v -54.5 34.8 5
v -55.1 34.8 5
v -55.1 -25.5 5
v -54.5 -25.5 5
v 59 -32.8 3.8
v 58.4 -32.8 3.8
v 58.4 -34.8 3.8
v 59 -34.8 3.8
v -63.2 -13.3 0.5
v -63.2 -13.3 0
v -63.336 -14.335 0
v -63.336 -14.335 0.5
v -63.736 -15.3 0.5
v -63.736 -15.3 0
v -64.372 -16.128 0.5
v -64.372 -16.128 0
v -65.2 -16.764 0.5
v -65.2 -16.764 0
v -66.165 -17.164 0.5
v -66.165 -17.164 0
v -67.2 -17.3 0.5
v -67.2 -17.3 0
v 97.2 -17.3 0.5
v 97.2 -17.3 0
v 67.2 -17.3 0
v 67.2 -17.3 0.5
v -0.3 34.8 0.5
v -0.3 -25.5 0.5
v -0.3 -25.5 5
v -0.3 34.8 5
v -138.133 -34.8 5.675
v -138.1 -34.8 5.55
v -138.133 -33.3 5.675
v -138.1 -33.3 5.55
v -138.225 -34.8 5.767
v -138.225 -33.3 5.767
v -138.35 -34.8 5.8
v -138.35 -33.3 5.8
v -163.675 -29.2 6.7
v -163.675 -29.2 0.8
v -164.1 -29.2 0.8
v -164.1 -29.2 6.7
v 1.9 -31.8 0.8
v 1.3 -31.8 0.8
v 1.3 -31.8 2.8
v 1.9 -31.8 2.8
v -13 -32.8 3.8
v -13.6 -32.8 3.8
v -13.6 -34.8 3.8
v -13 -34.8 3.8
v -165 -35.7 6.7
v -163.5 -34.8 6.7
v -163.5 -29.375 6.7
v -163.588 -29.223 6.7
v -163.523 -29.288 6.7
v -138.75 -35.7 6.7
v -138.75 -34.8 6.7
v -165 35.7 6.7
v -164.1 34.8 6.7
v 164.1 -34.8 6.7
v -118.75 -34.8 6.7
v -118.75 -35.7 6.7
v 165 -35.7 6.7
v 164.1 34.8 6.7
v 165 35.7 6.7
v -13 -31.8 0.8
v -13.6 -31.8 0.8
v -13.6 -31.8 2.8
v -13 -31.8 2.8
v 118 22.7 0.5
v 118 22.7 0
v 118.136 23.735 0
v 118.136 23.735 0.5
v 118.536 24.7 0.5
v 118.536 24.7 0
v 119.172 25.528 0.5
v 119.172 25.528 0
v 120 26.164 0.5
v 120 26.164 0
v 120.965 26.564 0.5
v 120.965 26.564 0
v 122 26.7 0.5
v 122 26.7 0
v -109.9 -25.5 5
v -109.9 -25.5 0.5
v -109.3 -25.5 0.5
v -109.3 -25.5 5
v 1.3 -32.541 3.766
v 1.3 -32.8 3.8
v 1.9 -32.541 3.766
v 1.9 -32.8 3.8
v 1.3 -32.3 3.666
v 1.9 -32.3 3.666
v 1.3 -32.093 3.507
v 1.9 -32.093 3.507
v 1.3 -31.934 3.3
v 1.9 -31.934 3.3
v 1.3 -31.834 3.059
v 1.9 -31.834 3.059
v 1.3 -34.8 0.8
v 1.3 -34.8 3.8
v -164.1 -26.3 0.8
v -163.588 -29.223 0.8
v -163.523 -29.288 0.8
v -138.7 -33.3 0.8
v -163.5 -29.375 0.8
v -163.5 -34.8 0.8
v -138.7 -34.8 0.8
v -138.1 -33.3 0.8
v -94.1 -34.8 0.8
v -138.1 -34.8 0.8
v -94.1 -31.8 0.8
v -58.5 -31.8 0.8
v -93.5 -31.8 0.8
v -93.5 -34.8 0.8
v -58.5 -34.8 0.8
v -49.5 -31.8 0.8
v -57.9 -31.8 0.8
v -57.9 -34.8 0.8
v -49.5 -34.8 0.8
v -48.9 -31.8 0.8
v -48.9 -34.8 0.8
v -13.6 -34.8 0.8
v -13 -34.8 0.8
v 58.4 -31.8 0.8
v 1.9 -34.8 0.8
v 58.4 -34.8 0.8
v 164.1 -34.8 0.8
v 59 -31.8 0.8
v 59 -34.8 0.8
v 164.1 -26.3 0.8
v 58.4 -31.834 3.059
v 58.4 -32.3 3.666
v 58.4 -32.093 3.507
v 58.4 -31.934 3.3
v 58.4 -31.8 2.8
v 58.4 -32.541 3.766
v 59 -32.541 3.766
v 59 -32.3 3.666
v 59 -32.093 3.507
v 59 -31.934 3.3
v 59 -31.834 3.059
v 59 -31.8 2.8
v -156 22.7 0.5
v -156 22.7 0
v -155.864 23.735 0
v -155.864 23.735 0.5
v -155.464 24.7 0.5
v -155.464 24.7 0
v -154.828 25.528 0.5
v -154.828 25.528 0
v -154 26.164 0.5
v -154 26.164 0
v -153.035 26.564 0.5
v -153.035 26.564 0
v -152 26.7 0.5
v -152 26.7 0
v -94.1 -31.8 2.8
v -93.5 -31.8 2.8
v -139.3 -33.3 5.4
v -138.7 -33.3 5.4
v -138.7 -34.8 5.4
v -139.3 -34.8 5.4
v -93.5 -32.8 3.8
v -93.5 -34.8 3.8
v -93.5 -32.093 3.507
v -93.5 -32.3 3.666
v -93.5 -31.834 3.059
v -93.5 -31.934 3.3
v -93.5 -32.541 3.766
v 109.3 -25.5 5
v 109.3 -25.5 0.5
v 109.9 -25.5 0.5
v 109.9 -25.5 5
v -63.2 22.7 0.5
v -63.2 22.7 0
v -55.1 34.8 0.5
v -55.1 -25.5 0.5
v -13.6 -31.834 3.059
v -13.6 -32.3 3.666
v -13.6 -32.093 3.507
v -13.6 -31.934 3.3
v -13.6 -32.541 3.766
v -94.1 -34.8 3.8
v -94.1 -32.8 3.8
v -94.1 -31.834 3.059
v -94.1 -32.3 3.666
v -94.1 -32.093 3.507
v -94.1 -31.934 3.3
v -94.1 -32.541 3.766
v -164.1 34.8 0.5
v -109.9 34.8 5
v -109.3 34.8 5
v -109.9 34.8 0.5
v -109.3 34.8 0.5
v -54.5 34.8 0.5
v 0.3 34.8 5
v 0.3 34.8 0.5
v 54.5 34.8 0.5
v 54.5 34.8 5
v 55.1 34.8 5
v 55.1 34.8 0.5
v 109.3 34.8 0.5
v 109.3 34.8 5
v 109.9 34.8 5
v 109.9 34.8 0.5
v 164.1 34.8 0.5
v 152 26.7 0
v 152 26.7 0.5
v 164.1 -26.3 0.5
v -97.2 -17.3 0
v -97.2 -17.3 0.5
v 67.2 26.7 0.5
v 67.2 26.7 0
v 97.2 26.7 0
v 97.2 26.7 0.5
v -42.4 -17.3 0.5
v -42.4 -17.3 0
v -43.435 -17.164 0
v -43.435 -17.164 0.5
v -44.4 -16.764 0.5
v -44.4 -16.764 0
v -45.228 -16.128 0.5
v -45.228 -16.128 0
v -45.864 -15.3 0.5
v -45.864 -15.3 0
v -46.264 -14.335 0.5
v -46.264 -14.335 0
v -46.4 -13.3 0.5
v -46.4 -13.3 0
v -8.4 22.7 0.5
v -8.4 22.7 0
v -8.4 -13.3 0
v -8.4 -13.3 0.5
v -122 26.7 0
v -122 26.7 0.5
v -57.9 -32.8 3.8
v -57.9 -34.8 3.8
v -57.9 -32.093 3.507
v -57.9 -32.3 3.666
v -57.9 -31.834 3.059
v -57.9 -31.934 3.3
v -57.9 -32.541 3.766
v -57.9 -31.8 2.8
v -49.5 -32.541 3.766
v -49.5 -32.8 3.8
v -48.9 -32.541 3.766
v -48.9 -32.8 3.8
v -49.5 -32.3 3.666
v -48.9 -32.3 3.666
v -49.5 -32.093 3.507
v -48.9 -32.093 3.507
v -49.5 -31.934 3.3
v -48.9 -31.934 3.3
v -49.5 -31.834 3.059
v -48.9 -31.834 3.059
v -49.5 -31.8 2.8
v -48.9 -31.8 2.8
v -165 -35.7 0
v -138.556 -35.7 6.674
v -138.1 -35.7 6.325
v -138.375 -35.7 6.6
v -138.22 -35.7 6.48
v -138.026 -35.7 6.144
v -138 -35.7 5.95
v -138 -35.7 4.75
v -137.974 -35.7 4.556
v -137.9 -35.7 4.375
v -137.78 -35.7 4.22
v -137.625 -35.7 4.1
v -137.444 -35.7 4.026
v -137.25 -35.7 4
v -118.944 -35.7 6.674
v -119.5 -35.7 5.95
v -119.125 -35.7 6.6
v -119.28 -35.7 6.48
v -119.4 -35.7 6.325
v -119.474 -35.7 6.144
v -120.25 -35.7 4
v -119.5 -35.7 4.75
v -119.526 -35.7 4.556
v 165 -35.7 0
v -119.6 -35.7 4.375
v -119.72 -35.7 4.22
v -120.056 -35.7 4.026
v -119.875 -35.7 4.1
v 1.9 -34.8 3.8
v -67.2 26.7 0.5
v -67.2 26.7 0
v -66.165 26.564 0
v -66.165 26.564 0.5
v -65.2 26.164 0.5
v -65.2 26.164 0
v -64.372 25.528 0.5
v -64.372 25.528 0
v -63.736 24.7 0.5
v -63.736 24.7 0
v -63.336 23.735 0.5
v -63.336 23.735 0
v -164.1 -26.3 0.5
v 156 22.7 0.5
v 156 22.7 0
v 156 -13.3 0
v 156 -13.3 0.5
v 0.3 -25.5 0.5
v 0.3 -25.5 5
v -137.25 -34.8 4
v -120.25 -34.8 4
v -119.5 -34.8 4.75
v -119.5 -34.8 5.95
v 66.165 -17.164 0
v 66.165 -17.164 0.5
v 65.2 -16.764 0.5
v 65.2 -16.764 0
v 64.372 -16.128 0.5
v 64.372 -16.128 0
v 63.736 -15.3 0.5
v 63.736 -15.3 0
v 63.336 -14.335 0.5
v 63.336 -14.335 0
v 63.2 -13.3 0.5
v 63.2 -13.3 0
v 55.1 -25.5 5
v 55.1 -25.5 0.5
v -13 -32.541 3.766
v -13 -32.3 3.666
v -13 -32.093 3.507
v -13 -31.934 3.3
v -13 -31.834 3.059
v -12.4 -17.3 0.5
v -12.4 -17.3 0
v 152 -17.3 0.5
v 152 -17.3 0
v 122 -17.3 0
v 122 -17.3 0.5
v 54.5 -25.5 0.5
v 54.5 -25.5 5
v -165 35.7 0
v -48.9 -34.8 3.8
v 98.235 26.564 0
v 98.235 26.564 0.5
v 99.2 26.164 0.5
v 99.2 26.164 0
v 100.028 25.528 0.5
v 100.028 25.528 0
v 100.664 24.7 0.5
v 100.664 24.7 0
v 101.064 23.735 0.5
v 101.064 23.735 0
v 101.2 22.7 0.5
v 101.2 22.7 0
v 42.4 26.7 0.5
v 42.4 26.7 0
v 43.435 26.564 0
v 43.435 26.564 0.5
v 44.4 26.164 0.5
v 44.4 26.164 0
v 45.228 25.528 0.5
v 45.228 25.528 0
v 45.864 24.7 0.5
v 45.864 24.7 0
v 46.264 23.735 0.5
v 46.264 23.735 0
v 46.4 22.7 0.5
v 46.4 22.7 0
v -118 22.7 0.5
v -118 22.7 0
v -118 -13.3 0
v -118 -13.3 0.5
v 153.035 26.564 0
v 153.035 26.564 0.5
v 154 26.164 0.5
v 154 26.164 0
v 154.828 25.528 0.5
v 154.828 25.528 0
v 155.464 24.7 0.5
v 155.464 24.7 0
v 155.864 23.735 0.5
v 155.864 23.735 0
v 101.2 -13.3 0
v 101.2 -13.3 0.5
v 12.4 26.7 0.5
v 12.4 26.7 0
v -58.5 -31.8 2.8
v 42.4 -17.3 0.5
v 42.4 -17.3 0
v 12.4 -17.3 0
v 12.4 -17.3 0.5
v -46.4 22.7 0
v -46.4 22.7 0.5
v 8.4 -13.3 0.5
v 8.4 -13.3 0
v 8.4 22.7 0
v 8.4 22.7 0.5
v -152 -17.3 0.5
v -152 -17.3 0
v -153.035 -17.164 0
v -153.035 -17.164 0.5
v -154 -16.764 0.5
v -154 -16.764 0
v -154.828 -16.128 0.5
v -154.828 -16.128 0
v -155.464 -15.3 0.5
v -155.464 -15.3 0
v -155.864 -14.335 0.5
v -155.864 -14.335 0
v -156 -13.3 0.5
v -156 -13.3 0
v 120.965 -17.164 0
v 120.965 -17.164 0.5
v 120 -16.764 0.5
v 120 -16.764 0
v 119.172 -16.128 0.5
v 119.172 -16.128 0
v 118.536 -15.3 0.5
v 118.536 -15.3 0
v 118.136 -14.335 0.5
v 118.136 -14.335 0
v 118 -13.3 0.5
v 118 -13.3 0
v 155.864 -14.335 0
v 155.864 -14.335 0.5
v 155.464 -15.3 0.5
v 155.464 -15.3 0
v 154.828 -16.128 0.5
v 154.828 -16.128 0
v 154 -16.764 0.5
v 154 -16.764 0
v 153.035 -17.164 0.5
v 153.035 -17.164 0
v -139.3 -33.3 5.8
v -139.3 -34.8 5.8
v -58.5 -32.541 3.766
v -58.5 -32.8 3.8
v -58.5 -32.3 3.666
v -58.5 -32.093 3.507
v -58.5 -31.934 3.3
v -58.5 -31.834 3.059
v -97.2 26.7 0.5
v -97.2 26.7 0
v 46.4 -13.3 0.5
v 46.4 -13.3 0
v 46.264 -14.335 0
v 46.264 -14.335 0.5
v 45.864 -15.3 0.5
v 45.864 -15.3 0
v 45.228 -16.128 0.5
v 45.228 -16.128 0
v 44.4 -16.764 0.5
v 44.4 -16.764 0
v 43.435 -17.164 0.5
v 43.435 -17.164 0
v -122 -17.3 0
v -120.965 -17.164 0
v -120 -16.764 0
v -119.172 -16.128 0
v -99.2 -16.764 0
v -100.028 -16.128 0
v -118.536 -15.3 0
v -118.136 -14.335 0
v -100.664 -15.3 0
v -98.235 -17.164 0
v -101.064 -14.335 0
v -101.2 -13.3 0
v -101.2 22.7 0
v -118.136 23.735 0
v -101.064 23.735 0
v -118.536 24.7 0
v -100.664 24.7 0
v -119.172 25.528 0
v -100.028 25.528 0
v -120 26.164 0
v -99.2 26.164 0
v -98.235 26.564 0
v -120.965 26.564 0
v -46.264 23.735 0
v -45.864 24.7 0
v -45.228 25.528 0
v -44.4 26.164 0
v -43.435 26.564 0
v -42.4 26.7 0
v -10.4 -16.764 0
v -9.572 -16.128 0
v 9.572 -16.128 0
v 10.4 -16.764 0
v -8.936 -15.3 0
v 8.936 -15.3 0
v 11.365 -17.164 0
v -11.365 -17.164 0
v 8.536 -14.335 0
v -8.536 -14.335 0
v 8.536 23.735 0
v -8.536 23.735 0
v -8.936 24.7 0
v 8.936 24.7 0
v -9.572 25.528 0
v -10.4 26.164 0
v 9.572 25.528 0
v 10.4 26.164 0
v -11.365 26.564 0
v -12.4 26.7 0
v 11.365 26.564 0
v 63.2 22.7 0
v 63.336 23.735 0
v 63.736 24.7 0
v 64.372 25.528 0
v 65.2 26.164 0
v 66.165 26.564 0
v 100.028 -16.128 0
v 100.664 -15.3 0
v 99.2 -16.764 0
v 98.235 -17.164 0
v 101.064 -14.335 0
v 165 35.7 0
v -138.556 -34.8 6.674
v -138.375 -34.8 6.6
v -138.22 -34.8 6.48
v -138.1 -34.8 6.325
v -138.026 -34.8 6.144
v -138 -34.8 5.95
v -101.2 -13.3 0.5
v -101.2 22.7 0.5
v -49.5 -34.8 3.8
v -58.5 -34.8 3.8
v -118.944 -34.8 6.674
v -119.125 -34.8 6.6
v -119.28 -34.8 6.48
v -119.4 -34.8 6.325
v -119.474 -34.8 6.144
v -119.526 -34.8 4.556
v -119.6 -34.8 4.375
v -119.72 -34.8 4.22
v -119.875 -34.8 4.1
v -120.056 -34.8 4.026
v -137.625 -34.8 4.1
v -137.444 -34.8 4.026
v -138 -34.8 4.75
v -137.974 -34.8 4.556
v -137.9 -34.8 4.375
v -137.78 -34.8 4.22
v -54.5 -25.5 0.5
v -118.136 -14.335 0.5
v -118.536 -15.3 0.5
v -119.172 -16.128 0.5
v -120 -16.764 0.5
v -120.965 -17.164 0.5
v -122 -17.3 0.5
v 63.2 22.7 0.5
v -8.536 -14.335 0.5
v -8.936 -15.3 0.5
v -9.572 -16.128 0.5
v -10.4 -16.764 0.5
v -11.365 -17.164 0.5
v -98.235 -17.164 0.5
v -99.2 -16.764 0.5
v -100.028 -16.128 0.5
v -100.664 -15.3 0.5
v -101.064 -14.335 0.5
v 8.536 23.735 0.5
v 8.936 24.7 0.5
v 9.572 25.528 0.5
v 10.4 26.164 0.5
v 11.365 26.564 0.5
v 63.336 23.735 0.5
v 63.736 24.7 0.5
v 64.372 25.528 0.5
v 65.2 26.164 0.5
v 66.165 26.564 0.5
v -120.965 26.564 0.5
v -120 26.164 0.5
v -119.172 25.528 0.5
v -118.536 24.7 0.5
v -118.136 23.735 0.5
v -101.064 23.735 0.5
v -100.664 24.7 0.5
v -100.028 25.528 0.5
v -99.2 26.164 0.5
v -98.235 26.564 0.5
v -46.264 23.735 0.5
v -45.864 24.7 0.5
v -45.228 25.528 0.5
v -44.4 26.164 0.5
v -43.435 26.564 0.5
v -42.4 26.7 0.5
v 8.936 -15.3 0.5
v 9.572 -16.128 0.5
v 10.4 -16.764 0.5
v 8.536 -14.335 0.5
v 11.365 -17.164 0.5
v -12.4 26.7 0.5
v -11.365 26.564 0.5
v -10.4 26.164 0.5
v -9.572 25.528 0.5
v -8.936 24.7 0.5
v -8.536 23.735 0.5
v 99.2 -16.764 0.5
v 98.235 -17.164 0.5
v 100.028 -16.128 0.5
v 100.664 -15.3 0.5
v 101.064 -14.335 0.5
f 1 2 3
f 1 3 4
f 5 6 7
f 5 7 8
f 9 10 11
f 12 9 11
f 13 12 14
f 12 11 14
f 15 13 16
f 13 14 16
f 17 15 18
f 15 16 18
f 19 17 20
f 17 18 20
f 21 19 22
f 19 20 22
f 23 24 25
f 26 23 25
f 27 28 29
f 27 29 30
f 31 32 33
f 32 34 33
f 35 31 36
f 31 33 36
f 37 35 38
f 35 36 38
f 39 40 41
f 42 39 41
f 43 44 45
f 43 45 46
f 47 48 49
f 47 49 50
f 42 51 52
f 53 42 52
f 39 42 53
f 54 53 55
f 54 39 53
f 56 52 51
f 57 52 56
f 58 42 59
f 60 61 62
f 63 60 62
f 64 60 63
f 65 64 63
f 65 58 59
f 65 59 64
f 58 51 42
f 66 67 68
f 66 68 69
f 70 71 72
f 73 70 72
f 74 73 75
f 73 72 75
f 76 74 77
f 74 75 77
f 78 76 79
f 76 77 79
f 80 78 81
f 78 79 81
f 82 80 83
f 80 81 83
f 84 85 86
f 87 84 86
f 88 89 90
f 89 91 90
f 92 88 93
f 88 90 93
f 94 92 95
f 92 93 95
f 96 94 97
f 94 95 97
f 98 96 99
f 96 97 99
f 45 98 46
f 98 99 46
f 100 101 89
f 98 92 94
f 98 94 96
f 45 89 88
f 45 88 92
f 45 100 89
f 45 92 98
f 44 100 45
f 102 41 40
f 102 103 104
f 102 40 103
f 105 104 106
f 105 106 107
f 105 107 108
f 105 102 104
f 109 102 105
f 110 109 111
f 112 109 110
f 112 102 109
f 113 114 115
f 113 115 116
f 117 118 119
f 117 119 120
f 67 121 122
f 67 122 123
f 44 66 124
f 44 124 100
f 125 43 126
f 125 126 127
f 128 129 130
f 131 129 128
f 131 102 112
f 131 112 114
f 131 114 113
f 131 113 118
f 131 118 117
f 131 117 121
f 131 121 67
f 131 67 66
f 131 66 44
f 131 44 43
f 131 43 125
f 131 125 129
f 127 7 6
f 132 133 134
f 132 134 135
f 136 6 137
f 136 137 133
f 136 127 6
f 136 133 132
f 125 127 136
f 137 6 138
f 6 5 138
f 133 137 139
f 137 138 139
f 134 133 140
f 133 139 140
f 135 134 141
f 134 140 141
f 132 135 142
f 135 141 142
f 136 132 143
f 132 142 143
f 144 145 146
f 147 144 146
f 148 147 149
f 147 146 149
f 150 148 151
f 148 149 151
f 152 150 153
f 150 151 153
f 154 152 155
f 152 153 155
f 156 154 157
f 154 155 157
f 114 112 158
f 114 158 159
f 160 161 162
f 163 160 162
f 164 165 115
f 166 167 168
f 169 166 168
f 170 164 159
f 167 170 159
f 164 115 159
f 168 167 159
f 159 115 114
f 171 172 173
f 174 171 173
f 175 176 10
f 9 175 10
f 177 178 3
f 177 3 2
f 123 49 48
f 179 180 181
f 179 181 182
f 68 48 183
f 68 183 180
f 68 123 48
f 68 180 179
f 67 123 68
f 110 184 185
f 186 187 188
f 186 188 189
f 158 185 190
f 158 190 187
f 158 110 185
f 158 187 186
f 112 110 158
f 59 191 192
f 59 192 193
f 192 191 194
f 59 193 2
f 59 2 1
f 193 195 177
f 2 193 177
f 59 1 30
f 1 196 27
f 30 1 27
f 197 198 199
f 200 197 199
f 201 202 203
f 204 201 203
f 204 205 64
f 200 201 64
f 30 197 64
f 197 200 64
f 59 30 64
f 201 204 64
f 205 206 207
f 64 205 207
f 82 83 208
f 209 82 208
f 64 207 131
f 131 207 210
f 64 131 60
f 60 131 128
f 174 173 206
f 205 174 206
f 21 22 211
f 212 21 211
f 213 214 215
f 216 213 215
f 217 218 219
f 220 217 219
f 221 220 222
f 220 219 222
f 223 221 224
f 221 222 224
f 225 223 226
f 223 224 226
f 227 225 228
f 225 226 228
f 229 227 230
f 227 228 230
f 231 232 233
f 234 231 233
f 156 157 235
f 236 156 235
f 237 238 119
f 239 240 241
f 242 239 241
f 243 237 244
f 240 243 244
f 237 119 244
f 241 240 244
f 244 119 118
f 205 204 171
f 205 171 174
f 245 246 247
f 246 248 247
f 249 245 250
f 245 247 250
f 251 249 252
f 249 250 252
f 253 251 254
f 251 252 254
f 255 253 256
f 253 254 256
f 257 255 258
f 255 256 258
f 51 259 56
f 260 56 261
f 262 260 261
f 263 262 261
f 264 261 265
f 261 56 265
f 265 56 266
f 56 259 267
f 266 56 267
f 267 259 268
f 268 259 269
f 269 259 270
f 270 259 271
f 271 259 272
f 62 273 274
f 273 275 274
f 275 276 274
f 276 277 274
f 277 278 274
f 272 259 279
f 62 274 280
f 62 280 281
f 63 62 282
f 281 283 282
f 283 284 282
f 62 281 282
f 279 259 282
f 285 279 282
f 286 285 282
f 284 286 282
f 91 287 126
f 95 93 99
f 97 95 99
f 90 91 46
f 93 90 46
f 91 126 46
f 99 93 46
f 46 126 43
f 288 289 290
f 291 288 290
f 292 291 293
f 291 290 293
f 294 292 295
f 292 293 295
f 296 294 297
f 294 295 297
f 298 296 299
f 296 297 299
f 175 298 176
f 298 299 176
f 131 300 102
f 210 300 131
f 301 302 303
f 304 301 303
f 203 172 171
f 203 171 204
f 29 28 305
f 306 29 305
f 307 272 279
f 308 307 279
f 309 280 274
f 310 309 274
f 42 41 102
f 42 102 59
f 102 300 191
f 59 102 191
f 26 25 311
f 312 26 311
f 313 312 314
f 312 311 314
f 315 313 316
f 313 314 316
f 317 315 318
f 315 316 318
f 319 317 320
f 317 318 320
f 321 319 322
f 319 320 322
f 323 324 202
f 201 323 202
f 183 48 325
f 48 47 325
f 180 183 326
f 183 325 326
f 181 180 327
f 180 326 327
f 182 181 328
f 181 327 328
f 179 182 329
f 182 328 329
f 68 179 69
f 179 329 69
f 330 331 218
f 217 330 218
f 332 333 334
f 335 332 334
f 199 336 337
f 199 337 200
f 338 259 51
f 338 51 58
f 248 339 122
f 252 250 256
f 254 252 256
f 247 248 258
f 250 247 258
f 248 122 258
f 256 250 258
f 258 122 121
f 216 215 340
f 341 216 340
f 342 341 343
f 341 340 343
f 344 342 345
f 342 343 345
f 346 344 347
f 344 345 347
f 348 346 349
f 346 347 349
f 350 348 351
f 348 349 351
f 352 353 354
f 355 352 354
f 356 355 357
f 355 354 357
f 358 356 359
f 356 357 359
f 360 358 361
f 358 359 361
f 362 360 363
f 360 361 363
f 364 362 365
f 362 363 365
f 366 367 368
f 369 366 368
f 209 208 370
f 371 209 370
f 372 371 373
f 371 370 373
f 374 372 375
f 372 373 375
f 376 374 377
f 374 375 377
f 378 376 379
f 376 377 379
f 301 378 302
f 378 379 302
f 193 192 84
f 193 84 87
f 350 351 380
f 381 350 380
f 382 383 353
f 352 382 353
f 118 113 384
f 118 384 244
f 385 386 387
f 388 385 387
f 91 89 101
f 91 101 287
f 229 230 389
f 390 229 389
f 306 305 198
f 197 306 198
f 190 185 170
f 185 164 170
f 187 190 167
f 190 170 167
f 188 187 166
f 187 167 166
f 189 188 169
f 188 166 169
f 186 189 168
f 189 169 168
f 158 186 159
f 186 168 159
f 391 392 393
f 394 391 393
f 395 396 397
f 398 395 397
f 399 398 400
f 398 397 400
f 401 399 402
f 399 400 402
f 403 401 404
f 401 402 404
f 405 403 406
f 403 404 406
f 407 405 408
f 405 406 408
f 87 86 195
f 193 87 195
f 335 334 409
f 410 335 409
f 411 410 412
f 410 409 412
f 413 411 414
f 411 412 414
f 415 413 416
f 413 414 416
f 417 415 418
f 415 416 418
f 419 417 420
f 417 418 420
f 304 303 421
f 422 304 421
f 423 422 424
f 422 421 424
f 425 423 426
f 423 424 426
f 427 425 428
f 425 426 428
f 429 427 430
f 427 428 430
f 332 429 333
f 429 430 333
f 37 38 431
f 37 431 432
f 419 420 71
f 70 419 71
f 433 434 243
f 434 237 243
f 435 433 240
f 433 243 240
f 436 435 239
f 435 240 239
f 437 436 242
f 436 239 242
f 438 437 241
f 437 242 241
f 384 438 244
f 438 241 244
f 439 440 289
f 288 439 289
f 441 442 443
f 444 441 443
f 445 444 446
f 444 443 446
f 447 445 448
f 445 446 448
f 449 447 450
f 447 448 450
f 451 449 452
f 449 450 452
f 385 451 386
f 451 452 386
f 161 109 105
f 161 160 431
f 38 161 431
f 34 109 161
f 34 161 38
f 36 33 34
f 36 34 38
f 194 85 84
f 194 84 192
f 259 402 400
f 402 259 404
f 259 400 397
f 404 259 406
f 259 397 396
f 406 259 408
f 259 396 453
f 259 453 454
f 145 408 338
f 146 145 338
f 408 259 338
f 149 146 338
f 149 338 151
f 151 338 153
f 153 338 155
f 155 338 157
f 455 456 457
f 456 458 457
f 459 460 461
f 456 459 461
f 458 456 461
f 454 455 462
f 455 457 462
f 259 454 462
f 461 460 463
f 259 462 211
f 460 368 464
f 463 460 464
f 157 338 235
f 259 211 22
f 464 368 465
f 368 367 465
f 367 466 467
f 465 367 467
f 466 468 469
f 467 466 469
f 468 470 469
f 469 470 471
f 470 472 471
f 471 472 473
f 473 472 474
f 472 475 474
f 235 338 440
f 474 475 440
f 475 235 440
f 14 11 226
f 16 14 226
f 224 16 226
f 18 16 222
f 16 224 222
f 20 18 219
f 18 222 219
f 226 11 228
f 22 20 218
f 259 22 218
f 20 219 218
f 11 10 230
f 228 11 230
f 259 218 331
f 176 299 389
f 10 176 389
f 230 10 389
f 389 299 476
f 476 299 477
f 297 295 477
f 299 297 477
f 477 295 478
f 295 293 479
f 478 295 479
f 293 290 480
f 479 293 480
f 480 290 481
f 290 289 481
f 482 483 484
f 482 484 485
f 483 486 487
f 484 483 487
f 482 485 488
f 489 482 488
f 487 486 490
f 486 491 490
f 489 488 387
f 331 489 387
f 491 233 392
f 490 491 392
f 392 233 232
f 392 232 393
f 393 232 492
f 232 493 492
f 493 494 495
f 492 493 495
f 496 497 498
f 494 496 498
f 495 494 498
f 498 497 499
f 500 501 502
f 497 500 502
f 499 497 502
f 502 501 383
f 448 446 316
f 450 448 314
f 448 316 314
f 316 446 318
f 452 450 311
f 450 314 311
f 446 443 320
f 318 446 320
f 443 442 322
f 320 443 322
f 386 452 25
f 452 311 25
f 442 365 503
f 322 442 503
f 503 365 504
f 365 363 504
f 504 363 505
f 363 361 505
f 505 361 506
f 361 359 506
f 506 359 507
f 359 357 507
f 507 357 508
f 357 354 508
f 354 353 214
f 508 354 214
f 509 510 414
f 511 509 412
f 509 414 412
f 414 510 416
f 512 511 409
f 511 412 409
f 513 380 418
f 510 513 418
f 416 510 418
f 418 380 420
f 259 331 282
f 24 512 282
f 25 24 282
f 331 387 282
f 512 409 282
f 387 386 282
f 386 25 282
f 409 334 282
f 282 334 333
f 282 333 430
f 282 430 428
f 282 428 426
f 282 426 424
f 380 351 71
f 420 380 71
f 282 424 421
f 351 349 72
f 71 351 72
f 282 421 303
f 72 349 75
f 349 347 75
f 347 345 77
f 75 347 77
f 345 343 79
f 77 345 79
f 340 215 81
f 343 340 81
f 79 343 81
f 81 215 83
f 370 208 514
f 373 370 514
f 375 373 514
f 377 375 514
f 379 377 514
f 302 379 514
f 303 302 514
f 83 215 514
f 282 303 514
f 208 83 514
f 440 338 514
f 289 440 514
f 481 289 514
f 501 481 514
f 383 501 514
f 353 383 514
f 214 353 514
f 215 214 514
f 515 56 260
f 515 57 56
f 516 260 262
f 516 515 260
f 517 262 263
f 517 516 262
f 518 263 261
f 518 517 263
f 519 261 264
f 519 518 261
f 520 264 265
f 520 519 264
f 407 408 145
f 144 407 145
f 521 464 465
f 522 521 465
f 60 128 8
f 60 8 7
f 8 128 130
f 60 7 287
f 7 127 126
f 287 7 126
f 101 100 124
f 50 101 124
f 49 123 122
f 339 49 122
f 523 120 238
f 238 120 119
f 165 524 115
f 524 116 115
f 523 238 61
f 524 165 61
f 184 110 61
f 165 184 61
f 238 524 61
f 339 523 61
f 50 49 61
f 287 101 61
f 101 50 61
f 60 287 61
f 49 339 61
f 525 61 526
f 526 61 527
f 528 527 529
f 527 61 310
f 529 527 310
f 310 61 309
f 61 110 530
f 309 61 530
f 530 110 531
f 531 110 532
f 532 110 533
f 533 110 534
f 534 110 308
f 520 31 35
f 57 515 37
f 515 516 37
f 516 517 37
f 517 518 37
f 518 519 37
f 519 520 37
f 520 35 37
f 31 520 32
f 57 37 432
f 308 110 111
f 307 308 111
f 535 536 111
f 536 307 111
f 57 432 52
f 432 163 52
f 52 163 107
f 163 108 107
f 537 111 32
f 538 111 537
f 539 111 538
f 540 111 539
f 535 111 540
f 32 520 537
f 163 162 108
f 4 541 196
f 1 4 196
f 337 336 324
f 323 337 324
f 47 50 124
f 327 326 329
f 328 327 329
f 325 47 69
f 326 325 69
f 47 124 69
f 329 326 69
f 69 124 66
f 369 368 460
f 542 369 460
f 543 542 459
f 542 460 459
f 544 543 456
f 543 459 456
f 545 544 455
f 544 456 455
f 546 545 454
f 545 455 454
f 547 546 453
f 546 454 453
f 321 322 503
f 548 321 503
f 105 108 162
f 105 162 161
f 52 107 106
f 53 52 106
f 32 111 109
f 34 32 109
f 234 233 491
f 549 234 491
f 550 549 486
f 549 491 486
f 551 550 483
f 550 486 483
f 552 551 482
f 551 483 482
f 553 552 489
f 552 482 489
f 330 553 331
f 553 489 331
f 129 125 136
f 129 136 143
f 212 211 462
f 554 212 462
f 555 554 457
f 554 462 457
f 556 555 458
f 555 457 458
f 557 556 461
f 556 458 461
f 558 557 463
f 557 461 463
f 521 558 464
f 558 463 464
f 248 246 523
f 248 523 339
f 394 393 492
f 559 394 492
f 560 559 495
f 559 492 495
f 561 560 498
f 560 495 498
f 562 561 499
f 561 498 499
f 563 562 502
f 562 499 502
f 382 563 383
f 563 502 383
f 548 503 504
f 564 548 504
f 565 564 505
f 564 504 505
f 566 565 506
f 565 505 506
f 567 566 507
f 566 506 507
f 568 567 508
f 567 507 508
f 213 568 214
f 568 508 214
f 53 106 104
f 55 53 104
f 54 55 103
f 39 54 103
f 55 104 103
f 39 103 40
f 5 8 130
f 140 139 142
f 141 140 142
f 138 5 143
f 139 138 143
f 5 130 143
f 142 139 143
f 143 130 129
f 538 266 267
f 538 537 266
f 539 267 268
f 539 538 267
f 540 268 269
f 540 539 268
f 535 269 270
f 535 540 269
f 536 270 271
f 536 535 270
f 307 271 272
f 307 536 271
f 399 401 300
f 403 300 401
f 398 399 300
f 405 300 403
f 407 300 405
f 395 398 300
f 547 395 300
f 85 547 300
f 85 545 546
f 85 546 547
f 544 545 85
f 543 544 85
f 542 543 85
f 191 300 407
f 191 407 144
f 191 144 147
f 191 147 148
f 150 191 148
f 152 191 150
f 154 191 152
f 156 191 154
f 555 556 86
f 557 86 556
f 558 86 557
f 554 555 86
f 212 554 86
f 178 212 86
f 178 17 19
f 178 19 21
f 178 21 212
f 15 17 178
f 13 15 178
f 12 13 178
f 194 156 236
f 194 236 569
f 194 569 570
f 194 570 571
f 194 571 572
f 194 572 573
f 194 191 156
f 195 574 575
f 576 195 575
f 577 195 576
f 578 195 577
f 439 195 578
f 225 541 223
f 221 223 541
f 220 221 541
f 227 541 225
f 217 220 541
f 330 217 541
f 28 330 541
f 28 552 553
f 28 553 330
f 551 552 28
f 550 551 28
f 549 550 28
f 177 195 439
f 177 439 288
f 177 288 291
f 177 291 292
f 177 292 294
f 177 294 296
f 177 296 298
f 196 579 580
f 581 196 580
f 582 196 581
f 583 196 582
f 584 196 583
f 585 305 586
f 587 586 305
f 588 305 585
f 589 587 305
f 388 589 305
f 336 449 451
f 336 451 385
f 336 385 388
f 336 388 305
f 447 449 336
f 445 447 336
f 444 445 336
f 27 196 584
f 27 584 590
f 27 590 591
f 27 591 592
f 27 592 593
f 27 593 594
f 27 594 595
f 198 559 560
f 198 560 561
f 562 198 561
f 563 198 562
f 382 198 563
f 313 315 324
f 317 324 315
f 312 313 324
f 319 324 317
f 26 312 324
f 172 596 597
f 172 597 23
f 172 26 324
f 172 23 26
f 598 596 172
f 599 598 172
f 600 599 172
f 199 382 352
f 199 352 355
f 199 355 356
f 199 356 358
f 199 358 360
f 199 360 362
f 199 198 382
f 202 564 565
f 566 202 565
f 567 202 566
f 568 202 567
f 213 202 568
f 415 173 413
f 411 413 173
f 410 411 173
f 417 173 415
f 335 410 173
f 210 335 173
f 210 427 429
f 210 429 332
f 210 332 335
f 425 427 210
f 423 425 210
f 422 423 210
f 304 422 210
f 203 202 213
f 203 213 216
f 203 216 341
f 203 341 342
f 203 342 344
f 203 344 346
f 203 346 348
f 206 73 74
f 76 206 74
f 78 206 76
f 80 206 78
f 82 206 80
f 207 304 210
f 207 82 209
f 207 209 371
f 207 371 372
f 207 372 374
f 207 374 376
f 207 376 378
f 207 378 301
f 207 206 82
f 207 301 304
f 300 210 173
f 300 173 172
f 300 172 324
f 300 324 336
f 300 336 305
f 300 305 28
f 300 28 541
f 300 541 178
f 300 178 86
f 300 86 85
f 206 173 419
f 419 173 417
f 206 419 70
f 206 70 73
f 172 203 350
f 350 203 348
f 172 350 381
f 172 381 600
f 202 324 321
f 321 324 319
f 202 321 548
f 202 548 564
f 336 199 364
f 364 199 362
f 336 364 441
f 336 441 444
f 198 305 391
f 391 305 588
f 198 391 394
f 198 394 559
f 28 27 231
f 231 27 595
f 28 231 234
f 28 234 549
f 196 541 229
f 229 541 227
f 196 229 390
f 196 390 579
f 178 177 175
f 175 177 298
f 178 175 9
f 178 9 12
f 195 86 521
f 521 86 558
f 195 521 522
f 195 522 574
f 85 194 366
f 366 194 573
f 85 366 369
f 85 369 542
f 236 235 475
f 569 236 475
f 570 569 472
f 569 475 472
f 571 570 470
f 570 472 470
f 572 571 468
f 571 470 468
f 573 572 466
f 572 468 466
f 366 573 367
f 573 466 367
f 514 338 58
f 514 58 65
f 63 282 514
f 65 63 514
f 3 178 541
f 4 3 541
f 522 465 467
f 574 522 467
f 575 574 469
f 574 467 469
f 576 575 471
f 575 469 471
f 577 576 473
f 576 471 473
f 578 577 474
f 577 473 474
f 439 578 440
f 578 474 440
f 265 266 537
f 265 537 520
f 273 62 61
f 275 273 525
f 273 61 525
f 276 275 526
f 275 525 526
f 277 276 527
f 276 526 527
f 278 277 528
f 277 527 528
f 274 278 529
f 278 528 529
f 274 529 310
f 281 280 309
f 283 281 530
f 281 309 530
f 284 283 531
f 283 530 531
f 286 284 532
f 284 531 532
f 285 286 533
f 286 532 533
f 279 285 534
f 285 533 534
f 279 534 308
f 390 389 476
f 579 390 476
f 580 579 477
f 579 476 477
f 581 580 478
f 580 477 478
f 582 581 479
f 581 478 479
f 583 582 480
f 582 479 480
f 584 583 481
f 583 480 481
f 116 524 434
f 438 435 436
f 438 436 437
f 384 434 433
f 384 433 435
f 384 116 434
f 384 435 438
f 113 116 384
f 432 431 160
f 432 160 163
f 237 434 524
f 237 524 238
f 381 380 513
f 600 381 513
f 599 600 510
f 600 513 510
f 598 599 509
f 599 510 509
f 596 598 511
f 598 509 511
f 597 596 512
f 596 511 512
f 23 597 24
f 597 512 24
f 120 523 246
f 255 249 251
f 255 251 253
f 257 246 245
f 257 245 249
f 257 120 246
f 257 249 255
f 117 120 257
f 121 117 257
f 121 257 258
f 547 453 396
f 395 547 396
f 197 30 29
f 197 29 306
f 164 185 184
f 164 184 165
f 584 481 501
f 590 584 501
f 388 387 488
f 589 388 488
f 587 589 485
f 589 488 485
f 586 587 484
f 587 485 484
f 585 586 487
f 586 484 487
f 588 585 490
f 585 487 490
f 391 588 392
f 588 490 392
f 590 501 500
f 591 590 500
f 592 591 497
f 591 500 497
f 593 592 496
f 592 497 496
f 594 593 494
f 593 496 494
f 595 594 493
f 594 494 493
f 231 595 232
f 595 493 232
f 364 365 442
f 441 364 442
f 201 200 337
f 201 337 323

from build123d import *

# Parameters (mm, degrees)
F1_DEPTH  = 0.5
F0_W      = 328.2
F0_H      = 8.5
F2_DEPTH  = 0.8
F0_W_2    = 330
F0_H_2    = 71.4
F3_DEPTH  = 6.7
F0_W_3    = 0.6
F0_H_3    = 60.3
F4_DEPTH  = 5
F6_DEPTH  = 5.9
F7_W      = 18.5
F7_H      = 2.7
F8_DEPTH  = 0.9
F9_R      = 0.75
F10_W     = 0.6
F10_H     = 1.5
F11_DEPTH = 5
F10_H_2   = 3
F12_DEPTH = 3
F13_R     = 1
F14_W     = 1.5
F14_H     = 0.4
F15_DEPTH = 0.6
F16_R     = 0.25


with BuildPart() as f1:
    # F0 (on Top) → F1 (new body)
    with BuildSketch(Plane.XY):
        Polygon((-164.1, 34.8), (-164.1, -26.3), (164.1, -26.3), (164.1, 34.8), (109.9, 34.8), (109.9, -25.5), (109.3, -25.5), (109.3, 34.8), (55.1, 34.8), (55.1, -25.5), (54.5, -25.5), (54.5, 34.8), (0.3, 34.8), (0.3, -25.5), (-0.3, -25.5), (-0.3, 34.8), (-54.5, 34.8), (-54.5, -25.5), (-55.1, -25.5), (-55.1, 34.8), (-109.3, 34.8), (-109.3, -25.5), (-109.9, -25.5), (-109.9, 34.8), align=None)
        with BuildLine():
            ThreePointArc((-156, 22.7), (-154.8284271247, 25.5284271247), (-152, 26.7))
            Line((-152, 26.7), (-122, 26.7))
            ThreePointArc((-122, 26.7), (-119.1715728753, 25.5284271247), (-118, 22.7))
            Line((-118, 22.7), (-118, -13.3))
            ThreePointArc((-118, -13.3), (-119.1715728753, -16.1284271247), (-122, -17.3))
            Line((-122, -17.3), (-152, -17.3))
            ThreePointArc((-152, -17.3), (-154.8284271247, -16.1284271247), (-156, -13.3))
            Line((-156, -13.3), (-156, 22.7))
        make_face(mode=Mode.SUBTRACT)
        with BuildLine():
            ThreePointArc((-67.2, 26.7), (-64.3715728753, 25.5284271247), (-63.2, 22.7))
            Line((-63.2, 22.7), (-63.2, -13.3))
            ThreePointArc((-63.2, -13.3), (-64.3715728753, -16.1284271247), (-67.2, -17.3))
            Line((-67.2, -17.3), (-97.2, -17.3))
            ThreePointArc((-97.2, -17.3), (-100.0284271247, -16.1284271247), (-101.2, -13.3))
            Line((-101.2, -13.3), (-101.2, 22.7))
            ThreePointArc((-101.2, 22.7), (-100.0284271247, 25.5284271247), (-97.2, 26.7))
            Line((-97.2, 26.7), (-67.2, 26.7))
        make_face(mode=Mode.SUBTRACT)
        with BuildLine():
            ThreePointArc((-12.4, 26.7), (-9.5715728753, 25.5284271247), (-8.4, 22.7))
            Line((-8.4, 22.7), (-8.4, -13.3))
            ThreePointArc((-8.4, -13.3), (-9.5715728753, -16.1284271247), (-12.4, -17.3))
            Line((-12.4, -17.3), (-42.4, -17.3))
            ThreePointArc((-42.4, -17.3), (-45.2284271247, -16.1284271247), (-46.4, -13.3))
            Line((-46.4, -13.3), (-46.4, 22.7))
            ThreePointArc((-46.4, 22.7), (-45.2284271247, 25.5284271247), (-42.4, 26.7))
            Line((-42.4, 26.7), (-12.4, 26.7))
        make_face(mode=Mode.SUBTRACT)
        with BuildLine():
            ThreePointArc((42.4, 26.7), (45.2284271247, 25.5284271247), (46.4, 22.7))
            Line((46.4, 22.7), (46.4, -13.3))
            ThreePointArc((46.4, -13.3), (45.2284271247, -16.1284271247), (42.4, -17.3))
            Line((42.4, -17.3), (12.4, -17.3))
            ThreePointArc((12.4, -17.3), (9.5715728753, -16.1284271247), (8.4, -13.3))
            Line((8.4, -13.3), (8.4, 22.7))
            ThreePointArc((8.4, 22.7), (9.5715728753, 25.5284271247), (12.4, 26.7))
            Line((12.4, 26.7), (42.4, 26.7))
        make_face(mode=Mode.SUBTRACT)
        with BuildLine():
            ThreePointArc((97.2, 26.7), (100.0284271247, 25.5284271247), (101.2, 22.7))
            Line((101.2, 22.7), (101.2, -13.3))
            ThreePointArc((101.2, -13.3), (100.0284271247, -16.1284271247), (97.2, -17.3))
            Line((97.2, -17.3), (67.2, -17.3))
            ThreePointArc((67.2, -17.3), (64.3715728753, -16.1284271247), (63.2, -13.3))
            Line((63.2, -13.3), (63.2, 22.7))
            ThreePointArc((63.2, 22.7), (64.3715728753, 25.5284271247), (67.2, 26.7))
            Line((67.2, 26.7), (97.2, 26.7))
        make_face(mode=Mode.SUBTRACT)
        with BuildLine():
            ThreePointArc((152, 26.7), (154.8284271247, 25.5284271247), (156, 22.7))
            Line((156, 22.7), (156, -13.3))
            ThreePointArc((156, -13.3), (154.8284271247, -16.1284271247), (152, -17.3))
            Line((152, -17.3), (122, -17.3))
            ThreePointArc((122, -17.3), (119.1715728753, -16.1284271247), (118, -13.3))
            Line((118, -13.3), (118, 22.7))
            ThreePointArc((118, 22.7), (119.1715728753, 25.5284271247), (122, 26.7))
            Line((122, 26.7), (152, 26.7))
        make_face(mode=Mode.SUBTRACT)
    extrude(amount=F1_DEPTH)

    # F0 (on Top) → F2 (join)
    with BuildSketch(Plane.XY):
        with Locations((0, -30.55)):
            Rectangle(F0_W, F0_H)
    extrude(amount=F2_DEPTH)

    # F0 (on Top) → F3 (join)
    with BuildSketch(Plane.XY):
        Rectangle(F0_W_2, F0_H_2)
        Polygon((164.1, -34.8), (-164.1, -34.8), (-164.1, -26.3), (-164.1, 34.8), (-109.9, 34.8), (-109.3, 34.8), (-55.1, 34.8), (-54.5, 34.8), (-0.3, 34.8), (0.3, 34.8), (54.5, 34.8), (55.1, 34.8), (109.3, 34.8), (109.9, 34.8), (164.1, 34.8), (164.1, -26.3), align=None, mode=Mode.SUBTRACT)
    extrude(amount=F3_DEPTH)

    # F0 (on Top) → F4 (join)
    with BuildSketch(Plane.XY):
        with Locations((-109.6, 4.65)):
            Rectangle(F0_W_3, F0_H_3)
        with Locations((-54.8, 4.65)):
            Rectangle(F0_W_3, F0_H_3)
        with Locations((0, 4.65)):
            Rectangle(F0_W_3, F0_H_3)
        with Locations((54.8, 4.65)):
            Rectangle(F0_W_3, F0_H_3)
        with Locations((109.6, 4.65)):
            Rectangle(F0_W_3, F0_H_3)
    extrude(amount=F4_DEPTH)

    # F5 (on face) → F6 (join, through all)
    with BuildSketch(Plane.XY.offset(0.8)):
        with BuildLine():
            Line((-163.6753737487, -29.2), (-164.1, -29.2))
            Line((-164.1, -29.2), (-164.1, -34.8))
            Line((-164.1, -34.8), (-163.5, -34.8))
            Line((-163.5, -34.8), (-163.5, -29.3753737487))
            ThreePointArc((-163.5, -29.3753737487), (-163.5513657817, -29.2513657817), (-163.6753737487, -29.2))
        make_face()
    extrude(amount=F6_DEPTH)

    # F7 (on face) → F8 (cut, through all)
    with BuildSketch(Plane.XZ.offset(35.7)):
        with Locations((-128.75, 5.35)):
            Rectangle(F7_W, F7_H)
    extrude(amount=-F8_DEPTH, mode=Mode.SUBTRACT)

    # F9
    f9_edges = [f1.edges().sort_by_distance(p)[0] for p in [
        (-138, -35.25, 6.7),
        (-119.5, -35.25, 6.7),
        (-138, -35.25, 4),
        (-119.5, -35.25, 4),
    ]]
    fillet(f9_edges, radius=F9_R)

    # F10 (on face) → F11 (join)
    with BuildSketch(Plane.XY.offset(0.8)):
        with Locations((-138.4, -34.05)):
            Rectangle(F10_W, F10_H)
    extrude(amount=F11_DEPTH)

    # F10 (on face) → F12 (join)
    with BuildSketch(Plane.XY.offset(0.8)):
        with Locations((-93.8, -33.3)):
            Rectangle(F10_W, F10_H_2)
        with Locations((-58.2, -33.3)):
            Rectangle(F10_W, F10_H_2)
        with Locations((-49.2, -33.3)):
            Rectangle(F10_W, F10_H_2)
        with Locations((-13.3, -33.3)):
            Rectangle(F10_W, F10_H_2)
        with Locations((1.6, -33.3)):
            Rectangle(F10_W, F10_H_2)
        with Locations((58.7, -33.3)):
            Rectangle(F10_W, F10_H_2)
    extrude(amount=F12_DEPTH)

    # F13
    f13_edges = [f1.edges().sort_by_distance(p)[0] for p in [
        (58.7, -31.8, 3.8),
        (1.6, -31.8, 3.8),
        (-13.3, -31.8, 3.8),
        (-49.2, -31.8, 3.8),
        (-58.2, -31.8, 3.8),
        (-93.8, -31.8, 3.8),
    ]]
    fillet(f13_edges, radius=F13_R)

    # F14 (on face) → F15 (join)
    with BuildSketch(Plane(origin=(-138.7, 0, 0), x_dir=(0, -1, 0), z_dir=(-1, 0, 0))):
        with Locations((34.05, 5.6)):
            Rectangle(F14_W, F14_H)
    extrude(amount=F15_DEPTH)

    # F16
    f16_edges = [f1.edges().sort_by_distance(p)[0] for p in [
        (-138.1, -34.05, 5.8),
    ]]
    fillet(f16_edges, radius=F16_R)


solid = f1.part
